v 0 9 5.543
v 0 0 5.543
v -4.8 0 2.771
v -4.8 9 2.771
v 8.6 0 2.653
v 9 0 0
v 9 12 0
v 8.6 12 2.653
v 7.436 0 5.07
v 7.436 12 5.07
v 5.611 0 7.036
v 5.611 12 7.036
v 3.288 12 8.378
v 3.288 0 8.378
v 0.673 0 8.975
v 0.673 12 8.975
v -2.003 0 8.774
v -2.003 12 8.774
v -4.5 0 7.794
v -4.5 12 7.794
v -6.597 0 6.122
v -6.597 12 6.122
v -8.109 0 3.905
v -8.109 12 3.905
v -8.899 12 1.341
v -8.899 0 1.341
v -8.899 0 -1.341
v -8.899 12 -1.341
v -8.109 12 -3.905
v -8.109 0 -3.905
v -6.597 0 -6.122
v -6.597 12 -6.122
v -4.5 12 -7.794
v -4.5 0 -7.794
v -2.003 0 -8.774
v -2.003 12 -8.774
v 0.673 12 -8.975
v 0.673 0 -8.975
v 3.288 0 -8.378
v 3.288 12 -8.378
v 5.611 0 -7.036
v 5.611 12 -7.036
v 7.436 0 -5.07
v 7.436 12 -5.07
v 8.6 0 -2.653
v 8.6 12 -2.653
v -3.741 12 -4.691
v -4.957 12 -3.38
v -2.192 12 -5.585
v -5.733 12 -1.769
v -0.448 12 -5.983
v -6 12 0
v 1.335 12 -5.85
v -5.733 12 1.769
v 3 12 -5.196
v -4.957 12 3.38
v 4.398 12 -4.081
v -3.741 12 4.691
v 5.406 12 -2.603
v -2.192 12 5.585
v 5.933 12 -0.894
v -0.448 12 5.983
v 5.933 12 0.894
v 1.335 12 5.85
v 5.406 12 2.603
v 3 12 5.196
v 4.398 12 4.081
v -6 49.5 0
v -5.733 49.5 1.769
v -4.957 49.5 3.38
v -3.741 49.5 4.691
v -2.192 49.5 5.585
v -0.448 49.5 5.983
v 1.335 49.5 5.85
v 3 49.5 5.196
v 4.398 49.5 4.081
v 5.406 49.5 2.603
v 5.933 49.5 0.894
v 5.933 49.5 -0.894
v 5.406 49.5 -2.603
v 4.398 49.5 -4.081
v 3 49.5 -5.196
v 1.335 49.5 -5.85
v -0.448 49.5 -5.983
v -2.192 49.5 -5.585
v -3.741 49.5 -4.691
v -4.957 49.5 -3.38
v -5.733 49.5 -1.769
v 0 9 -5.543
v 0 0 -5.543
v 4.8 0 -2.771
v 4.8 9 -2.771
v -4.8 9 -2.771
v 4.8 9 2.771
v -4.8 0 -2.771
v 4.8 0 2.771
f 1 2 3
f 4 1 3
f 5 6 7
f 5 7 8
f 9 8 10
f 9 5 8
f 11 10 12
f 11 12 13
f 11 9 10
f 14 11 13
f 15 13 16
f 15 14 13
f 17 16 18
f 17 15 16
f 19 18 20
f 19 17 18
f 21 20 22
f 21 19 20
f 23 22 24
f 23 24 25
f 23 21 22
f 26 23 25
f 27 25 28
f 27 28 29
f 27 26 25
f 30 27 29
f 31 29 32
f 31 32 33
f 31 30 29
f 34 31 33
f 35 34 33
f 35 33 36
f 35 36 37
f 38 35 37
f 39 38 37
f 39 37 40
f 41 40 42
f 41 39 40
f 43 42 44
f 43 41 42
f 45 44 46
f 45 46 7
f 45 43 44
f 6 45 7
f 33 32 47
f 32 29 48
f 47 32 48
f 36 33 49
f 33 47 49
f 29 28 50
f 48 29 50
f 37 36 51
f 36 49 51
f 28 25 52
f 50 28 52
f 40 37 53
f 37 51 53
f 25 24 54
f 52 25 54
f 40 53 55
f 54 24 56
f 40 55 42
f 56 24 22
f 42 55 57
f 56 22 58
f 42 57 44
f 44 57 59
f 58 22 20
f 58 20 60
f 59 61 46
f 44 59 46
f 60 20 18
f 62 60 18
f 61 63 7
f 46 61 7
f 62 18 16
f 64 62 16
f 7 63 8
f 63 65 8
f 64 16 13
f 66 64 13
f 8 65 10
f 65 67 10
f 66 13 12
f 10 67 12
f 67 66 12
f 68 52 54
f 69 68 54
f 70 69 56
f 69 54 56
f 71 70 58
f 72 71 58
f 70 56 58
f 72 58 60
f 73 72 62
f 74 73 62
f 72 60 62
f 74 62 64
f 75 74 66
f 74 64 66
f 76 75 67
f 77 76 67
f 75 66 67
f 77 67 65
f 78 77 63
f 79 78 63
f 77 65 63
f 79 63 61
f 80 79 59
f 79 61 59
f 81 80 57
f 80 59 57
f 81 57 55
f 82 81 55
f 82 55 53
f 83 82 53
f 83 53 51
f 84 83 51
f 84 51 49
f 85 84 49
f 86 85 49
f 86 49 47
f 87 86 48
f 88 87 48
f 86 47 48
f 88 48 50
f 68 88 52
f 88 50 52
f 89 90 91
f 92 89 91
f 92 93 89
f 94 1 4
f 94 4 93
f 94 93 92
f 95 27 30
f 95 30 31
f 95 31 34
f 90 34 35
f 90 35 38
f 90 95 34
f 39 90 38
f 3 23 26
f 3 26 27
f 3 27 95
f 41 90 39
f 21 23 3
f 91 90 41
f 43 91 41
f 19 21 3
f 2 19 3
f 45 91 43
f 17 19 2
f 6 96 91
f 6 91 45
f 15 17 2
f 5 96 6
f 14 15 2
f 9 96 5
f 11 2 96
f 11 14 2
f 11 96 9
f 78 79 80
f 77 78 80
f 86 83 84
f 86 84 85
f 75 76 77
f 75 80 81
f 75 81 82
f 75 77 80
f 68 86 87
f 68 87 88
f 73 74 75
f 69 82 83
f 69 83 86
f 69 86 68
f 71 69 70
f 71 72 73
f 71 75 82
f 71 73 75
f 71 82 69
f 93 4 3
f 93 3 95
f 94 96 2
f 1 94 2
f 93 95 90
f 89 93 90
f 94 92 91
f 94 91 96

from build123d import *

# Parameters (mm, degrees)
F0_R     = 9
F1_DEPTH = 12
F2_R     = 6
F3_DEPTH = 37.5
F5_DEPTH = 9


with BuildPart() as f1:
    # F0 (on Front) → F1 (new body)
    with BuildSketch(Plane.XZ):
        Circle(F0_R)
    extrude(amount=-F1_DEPTH)

    # F2 (on face) → F3 (join)
    with BuildSketch(Plane(origin=(0, 12, 0), x_dir=(-1, 0, 0), z_dir=(0, 1, 0))):
        Circle(F2_R)
    extrude(amount=F3_DEPTH)

    # F4 (on face) → F5 (cut)
    with BuildSketch(Plane.XZ):
        Polygon((4.8, -2.771281), (4.8, 2.771281), (0, 5.542563), (-4.8, 2.771281), (-4.8, -2.771281), (0, -5.542563), align=None)
    extrude(amount=-F5_DEPTH, mode=Mode.SUBTRACT)


solid = f1.part
